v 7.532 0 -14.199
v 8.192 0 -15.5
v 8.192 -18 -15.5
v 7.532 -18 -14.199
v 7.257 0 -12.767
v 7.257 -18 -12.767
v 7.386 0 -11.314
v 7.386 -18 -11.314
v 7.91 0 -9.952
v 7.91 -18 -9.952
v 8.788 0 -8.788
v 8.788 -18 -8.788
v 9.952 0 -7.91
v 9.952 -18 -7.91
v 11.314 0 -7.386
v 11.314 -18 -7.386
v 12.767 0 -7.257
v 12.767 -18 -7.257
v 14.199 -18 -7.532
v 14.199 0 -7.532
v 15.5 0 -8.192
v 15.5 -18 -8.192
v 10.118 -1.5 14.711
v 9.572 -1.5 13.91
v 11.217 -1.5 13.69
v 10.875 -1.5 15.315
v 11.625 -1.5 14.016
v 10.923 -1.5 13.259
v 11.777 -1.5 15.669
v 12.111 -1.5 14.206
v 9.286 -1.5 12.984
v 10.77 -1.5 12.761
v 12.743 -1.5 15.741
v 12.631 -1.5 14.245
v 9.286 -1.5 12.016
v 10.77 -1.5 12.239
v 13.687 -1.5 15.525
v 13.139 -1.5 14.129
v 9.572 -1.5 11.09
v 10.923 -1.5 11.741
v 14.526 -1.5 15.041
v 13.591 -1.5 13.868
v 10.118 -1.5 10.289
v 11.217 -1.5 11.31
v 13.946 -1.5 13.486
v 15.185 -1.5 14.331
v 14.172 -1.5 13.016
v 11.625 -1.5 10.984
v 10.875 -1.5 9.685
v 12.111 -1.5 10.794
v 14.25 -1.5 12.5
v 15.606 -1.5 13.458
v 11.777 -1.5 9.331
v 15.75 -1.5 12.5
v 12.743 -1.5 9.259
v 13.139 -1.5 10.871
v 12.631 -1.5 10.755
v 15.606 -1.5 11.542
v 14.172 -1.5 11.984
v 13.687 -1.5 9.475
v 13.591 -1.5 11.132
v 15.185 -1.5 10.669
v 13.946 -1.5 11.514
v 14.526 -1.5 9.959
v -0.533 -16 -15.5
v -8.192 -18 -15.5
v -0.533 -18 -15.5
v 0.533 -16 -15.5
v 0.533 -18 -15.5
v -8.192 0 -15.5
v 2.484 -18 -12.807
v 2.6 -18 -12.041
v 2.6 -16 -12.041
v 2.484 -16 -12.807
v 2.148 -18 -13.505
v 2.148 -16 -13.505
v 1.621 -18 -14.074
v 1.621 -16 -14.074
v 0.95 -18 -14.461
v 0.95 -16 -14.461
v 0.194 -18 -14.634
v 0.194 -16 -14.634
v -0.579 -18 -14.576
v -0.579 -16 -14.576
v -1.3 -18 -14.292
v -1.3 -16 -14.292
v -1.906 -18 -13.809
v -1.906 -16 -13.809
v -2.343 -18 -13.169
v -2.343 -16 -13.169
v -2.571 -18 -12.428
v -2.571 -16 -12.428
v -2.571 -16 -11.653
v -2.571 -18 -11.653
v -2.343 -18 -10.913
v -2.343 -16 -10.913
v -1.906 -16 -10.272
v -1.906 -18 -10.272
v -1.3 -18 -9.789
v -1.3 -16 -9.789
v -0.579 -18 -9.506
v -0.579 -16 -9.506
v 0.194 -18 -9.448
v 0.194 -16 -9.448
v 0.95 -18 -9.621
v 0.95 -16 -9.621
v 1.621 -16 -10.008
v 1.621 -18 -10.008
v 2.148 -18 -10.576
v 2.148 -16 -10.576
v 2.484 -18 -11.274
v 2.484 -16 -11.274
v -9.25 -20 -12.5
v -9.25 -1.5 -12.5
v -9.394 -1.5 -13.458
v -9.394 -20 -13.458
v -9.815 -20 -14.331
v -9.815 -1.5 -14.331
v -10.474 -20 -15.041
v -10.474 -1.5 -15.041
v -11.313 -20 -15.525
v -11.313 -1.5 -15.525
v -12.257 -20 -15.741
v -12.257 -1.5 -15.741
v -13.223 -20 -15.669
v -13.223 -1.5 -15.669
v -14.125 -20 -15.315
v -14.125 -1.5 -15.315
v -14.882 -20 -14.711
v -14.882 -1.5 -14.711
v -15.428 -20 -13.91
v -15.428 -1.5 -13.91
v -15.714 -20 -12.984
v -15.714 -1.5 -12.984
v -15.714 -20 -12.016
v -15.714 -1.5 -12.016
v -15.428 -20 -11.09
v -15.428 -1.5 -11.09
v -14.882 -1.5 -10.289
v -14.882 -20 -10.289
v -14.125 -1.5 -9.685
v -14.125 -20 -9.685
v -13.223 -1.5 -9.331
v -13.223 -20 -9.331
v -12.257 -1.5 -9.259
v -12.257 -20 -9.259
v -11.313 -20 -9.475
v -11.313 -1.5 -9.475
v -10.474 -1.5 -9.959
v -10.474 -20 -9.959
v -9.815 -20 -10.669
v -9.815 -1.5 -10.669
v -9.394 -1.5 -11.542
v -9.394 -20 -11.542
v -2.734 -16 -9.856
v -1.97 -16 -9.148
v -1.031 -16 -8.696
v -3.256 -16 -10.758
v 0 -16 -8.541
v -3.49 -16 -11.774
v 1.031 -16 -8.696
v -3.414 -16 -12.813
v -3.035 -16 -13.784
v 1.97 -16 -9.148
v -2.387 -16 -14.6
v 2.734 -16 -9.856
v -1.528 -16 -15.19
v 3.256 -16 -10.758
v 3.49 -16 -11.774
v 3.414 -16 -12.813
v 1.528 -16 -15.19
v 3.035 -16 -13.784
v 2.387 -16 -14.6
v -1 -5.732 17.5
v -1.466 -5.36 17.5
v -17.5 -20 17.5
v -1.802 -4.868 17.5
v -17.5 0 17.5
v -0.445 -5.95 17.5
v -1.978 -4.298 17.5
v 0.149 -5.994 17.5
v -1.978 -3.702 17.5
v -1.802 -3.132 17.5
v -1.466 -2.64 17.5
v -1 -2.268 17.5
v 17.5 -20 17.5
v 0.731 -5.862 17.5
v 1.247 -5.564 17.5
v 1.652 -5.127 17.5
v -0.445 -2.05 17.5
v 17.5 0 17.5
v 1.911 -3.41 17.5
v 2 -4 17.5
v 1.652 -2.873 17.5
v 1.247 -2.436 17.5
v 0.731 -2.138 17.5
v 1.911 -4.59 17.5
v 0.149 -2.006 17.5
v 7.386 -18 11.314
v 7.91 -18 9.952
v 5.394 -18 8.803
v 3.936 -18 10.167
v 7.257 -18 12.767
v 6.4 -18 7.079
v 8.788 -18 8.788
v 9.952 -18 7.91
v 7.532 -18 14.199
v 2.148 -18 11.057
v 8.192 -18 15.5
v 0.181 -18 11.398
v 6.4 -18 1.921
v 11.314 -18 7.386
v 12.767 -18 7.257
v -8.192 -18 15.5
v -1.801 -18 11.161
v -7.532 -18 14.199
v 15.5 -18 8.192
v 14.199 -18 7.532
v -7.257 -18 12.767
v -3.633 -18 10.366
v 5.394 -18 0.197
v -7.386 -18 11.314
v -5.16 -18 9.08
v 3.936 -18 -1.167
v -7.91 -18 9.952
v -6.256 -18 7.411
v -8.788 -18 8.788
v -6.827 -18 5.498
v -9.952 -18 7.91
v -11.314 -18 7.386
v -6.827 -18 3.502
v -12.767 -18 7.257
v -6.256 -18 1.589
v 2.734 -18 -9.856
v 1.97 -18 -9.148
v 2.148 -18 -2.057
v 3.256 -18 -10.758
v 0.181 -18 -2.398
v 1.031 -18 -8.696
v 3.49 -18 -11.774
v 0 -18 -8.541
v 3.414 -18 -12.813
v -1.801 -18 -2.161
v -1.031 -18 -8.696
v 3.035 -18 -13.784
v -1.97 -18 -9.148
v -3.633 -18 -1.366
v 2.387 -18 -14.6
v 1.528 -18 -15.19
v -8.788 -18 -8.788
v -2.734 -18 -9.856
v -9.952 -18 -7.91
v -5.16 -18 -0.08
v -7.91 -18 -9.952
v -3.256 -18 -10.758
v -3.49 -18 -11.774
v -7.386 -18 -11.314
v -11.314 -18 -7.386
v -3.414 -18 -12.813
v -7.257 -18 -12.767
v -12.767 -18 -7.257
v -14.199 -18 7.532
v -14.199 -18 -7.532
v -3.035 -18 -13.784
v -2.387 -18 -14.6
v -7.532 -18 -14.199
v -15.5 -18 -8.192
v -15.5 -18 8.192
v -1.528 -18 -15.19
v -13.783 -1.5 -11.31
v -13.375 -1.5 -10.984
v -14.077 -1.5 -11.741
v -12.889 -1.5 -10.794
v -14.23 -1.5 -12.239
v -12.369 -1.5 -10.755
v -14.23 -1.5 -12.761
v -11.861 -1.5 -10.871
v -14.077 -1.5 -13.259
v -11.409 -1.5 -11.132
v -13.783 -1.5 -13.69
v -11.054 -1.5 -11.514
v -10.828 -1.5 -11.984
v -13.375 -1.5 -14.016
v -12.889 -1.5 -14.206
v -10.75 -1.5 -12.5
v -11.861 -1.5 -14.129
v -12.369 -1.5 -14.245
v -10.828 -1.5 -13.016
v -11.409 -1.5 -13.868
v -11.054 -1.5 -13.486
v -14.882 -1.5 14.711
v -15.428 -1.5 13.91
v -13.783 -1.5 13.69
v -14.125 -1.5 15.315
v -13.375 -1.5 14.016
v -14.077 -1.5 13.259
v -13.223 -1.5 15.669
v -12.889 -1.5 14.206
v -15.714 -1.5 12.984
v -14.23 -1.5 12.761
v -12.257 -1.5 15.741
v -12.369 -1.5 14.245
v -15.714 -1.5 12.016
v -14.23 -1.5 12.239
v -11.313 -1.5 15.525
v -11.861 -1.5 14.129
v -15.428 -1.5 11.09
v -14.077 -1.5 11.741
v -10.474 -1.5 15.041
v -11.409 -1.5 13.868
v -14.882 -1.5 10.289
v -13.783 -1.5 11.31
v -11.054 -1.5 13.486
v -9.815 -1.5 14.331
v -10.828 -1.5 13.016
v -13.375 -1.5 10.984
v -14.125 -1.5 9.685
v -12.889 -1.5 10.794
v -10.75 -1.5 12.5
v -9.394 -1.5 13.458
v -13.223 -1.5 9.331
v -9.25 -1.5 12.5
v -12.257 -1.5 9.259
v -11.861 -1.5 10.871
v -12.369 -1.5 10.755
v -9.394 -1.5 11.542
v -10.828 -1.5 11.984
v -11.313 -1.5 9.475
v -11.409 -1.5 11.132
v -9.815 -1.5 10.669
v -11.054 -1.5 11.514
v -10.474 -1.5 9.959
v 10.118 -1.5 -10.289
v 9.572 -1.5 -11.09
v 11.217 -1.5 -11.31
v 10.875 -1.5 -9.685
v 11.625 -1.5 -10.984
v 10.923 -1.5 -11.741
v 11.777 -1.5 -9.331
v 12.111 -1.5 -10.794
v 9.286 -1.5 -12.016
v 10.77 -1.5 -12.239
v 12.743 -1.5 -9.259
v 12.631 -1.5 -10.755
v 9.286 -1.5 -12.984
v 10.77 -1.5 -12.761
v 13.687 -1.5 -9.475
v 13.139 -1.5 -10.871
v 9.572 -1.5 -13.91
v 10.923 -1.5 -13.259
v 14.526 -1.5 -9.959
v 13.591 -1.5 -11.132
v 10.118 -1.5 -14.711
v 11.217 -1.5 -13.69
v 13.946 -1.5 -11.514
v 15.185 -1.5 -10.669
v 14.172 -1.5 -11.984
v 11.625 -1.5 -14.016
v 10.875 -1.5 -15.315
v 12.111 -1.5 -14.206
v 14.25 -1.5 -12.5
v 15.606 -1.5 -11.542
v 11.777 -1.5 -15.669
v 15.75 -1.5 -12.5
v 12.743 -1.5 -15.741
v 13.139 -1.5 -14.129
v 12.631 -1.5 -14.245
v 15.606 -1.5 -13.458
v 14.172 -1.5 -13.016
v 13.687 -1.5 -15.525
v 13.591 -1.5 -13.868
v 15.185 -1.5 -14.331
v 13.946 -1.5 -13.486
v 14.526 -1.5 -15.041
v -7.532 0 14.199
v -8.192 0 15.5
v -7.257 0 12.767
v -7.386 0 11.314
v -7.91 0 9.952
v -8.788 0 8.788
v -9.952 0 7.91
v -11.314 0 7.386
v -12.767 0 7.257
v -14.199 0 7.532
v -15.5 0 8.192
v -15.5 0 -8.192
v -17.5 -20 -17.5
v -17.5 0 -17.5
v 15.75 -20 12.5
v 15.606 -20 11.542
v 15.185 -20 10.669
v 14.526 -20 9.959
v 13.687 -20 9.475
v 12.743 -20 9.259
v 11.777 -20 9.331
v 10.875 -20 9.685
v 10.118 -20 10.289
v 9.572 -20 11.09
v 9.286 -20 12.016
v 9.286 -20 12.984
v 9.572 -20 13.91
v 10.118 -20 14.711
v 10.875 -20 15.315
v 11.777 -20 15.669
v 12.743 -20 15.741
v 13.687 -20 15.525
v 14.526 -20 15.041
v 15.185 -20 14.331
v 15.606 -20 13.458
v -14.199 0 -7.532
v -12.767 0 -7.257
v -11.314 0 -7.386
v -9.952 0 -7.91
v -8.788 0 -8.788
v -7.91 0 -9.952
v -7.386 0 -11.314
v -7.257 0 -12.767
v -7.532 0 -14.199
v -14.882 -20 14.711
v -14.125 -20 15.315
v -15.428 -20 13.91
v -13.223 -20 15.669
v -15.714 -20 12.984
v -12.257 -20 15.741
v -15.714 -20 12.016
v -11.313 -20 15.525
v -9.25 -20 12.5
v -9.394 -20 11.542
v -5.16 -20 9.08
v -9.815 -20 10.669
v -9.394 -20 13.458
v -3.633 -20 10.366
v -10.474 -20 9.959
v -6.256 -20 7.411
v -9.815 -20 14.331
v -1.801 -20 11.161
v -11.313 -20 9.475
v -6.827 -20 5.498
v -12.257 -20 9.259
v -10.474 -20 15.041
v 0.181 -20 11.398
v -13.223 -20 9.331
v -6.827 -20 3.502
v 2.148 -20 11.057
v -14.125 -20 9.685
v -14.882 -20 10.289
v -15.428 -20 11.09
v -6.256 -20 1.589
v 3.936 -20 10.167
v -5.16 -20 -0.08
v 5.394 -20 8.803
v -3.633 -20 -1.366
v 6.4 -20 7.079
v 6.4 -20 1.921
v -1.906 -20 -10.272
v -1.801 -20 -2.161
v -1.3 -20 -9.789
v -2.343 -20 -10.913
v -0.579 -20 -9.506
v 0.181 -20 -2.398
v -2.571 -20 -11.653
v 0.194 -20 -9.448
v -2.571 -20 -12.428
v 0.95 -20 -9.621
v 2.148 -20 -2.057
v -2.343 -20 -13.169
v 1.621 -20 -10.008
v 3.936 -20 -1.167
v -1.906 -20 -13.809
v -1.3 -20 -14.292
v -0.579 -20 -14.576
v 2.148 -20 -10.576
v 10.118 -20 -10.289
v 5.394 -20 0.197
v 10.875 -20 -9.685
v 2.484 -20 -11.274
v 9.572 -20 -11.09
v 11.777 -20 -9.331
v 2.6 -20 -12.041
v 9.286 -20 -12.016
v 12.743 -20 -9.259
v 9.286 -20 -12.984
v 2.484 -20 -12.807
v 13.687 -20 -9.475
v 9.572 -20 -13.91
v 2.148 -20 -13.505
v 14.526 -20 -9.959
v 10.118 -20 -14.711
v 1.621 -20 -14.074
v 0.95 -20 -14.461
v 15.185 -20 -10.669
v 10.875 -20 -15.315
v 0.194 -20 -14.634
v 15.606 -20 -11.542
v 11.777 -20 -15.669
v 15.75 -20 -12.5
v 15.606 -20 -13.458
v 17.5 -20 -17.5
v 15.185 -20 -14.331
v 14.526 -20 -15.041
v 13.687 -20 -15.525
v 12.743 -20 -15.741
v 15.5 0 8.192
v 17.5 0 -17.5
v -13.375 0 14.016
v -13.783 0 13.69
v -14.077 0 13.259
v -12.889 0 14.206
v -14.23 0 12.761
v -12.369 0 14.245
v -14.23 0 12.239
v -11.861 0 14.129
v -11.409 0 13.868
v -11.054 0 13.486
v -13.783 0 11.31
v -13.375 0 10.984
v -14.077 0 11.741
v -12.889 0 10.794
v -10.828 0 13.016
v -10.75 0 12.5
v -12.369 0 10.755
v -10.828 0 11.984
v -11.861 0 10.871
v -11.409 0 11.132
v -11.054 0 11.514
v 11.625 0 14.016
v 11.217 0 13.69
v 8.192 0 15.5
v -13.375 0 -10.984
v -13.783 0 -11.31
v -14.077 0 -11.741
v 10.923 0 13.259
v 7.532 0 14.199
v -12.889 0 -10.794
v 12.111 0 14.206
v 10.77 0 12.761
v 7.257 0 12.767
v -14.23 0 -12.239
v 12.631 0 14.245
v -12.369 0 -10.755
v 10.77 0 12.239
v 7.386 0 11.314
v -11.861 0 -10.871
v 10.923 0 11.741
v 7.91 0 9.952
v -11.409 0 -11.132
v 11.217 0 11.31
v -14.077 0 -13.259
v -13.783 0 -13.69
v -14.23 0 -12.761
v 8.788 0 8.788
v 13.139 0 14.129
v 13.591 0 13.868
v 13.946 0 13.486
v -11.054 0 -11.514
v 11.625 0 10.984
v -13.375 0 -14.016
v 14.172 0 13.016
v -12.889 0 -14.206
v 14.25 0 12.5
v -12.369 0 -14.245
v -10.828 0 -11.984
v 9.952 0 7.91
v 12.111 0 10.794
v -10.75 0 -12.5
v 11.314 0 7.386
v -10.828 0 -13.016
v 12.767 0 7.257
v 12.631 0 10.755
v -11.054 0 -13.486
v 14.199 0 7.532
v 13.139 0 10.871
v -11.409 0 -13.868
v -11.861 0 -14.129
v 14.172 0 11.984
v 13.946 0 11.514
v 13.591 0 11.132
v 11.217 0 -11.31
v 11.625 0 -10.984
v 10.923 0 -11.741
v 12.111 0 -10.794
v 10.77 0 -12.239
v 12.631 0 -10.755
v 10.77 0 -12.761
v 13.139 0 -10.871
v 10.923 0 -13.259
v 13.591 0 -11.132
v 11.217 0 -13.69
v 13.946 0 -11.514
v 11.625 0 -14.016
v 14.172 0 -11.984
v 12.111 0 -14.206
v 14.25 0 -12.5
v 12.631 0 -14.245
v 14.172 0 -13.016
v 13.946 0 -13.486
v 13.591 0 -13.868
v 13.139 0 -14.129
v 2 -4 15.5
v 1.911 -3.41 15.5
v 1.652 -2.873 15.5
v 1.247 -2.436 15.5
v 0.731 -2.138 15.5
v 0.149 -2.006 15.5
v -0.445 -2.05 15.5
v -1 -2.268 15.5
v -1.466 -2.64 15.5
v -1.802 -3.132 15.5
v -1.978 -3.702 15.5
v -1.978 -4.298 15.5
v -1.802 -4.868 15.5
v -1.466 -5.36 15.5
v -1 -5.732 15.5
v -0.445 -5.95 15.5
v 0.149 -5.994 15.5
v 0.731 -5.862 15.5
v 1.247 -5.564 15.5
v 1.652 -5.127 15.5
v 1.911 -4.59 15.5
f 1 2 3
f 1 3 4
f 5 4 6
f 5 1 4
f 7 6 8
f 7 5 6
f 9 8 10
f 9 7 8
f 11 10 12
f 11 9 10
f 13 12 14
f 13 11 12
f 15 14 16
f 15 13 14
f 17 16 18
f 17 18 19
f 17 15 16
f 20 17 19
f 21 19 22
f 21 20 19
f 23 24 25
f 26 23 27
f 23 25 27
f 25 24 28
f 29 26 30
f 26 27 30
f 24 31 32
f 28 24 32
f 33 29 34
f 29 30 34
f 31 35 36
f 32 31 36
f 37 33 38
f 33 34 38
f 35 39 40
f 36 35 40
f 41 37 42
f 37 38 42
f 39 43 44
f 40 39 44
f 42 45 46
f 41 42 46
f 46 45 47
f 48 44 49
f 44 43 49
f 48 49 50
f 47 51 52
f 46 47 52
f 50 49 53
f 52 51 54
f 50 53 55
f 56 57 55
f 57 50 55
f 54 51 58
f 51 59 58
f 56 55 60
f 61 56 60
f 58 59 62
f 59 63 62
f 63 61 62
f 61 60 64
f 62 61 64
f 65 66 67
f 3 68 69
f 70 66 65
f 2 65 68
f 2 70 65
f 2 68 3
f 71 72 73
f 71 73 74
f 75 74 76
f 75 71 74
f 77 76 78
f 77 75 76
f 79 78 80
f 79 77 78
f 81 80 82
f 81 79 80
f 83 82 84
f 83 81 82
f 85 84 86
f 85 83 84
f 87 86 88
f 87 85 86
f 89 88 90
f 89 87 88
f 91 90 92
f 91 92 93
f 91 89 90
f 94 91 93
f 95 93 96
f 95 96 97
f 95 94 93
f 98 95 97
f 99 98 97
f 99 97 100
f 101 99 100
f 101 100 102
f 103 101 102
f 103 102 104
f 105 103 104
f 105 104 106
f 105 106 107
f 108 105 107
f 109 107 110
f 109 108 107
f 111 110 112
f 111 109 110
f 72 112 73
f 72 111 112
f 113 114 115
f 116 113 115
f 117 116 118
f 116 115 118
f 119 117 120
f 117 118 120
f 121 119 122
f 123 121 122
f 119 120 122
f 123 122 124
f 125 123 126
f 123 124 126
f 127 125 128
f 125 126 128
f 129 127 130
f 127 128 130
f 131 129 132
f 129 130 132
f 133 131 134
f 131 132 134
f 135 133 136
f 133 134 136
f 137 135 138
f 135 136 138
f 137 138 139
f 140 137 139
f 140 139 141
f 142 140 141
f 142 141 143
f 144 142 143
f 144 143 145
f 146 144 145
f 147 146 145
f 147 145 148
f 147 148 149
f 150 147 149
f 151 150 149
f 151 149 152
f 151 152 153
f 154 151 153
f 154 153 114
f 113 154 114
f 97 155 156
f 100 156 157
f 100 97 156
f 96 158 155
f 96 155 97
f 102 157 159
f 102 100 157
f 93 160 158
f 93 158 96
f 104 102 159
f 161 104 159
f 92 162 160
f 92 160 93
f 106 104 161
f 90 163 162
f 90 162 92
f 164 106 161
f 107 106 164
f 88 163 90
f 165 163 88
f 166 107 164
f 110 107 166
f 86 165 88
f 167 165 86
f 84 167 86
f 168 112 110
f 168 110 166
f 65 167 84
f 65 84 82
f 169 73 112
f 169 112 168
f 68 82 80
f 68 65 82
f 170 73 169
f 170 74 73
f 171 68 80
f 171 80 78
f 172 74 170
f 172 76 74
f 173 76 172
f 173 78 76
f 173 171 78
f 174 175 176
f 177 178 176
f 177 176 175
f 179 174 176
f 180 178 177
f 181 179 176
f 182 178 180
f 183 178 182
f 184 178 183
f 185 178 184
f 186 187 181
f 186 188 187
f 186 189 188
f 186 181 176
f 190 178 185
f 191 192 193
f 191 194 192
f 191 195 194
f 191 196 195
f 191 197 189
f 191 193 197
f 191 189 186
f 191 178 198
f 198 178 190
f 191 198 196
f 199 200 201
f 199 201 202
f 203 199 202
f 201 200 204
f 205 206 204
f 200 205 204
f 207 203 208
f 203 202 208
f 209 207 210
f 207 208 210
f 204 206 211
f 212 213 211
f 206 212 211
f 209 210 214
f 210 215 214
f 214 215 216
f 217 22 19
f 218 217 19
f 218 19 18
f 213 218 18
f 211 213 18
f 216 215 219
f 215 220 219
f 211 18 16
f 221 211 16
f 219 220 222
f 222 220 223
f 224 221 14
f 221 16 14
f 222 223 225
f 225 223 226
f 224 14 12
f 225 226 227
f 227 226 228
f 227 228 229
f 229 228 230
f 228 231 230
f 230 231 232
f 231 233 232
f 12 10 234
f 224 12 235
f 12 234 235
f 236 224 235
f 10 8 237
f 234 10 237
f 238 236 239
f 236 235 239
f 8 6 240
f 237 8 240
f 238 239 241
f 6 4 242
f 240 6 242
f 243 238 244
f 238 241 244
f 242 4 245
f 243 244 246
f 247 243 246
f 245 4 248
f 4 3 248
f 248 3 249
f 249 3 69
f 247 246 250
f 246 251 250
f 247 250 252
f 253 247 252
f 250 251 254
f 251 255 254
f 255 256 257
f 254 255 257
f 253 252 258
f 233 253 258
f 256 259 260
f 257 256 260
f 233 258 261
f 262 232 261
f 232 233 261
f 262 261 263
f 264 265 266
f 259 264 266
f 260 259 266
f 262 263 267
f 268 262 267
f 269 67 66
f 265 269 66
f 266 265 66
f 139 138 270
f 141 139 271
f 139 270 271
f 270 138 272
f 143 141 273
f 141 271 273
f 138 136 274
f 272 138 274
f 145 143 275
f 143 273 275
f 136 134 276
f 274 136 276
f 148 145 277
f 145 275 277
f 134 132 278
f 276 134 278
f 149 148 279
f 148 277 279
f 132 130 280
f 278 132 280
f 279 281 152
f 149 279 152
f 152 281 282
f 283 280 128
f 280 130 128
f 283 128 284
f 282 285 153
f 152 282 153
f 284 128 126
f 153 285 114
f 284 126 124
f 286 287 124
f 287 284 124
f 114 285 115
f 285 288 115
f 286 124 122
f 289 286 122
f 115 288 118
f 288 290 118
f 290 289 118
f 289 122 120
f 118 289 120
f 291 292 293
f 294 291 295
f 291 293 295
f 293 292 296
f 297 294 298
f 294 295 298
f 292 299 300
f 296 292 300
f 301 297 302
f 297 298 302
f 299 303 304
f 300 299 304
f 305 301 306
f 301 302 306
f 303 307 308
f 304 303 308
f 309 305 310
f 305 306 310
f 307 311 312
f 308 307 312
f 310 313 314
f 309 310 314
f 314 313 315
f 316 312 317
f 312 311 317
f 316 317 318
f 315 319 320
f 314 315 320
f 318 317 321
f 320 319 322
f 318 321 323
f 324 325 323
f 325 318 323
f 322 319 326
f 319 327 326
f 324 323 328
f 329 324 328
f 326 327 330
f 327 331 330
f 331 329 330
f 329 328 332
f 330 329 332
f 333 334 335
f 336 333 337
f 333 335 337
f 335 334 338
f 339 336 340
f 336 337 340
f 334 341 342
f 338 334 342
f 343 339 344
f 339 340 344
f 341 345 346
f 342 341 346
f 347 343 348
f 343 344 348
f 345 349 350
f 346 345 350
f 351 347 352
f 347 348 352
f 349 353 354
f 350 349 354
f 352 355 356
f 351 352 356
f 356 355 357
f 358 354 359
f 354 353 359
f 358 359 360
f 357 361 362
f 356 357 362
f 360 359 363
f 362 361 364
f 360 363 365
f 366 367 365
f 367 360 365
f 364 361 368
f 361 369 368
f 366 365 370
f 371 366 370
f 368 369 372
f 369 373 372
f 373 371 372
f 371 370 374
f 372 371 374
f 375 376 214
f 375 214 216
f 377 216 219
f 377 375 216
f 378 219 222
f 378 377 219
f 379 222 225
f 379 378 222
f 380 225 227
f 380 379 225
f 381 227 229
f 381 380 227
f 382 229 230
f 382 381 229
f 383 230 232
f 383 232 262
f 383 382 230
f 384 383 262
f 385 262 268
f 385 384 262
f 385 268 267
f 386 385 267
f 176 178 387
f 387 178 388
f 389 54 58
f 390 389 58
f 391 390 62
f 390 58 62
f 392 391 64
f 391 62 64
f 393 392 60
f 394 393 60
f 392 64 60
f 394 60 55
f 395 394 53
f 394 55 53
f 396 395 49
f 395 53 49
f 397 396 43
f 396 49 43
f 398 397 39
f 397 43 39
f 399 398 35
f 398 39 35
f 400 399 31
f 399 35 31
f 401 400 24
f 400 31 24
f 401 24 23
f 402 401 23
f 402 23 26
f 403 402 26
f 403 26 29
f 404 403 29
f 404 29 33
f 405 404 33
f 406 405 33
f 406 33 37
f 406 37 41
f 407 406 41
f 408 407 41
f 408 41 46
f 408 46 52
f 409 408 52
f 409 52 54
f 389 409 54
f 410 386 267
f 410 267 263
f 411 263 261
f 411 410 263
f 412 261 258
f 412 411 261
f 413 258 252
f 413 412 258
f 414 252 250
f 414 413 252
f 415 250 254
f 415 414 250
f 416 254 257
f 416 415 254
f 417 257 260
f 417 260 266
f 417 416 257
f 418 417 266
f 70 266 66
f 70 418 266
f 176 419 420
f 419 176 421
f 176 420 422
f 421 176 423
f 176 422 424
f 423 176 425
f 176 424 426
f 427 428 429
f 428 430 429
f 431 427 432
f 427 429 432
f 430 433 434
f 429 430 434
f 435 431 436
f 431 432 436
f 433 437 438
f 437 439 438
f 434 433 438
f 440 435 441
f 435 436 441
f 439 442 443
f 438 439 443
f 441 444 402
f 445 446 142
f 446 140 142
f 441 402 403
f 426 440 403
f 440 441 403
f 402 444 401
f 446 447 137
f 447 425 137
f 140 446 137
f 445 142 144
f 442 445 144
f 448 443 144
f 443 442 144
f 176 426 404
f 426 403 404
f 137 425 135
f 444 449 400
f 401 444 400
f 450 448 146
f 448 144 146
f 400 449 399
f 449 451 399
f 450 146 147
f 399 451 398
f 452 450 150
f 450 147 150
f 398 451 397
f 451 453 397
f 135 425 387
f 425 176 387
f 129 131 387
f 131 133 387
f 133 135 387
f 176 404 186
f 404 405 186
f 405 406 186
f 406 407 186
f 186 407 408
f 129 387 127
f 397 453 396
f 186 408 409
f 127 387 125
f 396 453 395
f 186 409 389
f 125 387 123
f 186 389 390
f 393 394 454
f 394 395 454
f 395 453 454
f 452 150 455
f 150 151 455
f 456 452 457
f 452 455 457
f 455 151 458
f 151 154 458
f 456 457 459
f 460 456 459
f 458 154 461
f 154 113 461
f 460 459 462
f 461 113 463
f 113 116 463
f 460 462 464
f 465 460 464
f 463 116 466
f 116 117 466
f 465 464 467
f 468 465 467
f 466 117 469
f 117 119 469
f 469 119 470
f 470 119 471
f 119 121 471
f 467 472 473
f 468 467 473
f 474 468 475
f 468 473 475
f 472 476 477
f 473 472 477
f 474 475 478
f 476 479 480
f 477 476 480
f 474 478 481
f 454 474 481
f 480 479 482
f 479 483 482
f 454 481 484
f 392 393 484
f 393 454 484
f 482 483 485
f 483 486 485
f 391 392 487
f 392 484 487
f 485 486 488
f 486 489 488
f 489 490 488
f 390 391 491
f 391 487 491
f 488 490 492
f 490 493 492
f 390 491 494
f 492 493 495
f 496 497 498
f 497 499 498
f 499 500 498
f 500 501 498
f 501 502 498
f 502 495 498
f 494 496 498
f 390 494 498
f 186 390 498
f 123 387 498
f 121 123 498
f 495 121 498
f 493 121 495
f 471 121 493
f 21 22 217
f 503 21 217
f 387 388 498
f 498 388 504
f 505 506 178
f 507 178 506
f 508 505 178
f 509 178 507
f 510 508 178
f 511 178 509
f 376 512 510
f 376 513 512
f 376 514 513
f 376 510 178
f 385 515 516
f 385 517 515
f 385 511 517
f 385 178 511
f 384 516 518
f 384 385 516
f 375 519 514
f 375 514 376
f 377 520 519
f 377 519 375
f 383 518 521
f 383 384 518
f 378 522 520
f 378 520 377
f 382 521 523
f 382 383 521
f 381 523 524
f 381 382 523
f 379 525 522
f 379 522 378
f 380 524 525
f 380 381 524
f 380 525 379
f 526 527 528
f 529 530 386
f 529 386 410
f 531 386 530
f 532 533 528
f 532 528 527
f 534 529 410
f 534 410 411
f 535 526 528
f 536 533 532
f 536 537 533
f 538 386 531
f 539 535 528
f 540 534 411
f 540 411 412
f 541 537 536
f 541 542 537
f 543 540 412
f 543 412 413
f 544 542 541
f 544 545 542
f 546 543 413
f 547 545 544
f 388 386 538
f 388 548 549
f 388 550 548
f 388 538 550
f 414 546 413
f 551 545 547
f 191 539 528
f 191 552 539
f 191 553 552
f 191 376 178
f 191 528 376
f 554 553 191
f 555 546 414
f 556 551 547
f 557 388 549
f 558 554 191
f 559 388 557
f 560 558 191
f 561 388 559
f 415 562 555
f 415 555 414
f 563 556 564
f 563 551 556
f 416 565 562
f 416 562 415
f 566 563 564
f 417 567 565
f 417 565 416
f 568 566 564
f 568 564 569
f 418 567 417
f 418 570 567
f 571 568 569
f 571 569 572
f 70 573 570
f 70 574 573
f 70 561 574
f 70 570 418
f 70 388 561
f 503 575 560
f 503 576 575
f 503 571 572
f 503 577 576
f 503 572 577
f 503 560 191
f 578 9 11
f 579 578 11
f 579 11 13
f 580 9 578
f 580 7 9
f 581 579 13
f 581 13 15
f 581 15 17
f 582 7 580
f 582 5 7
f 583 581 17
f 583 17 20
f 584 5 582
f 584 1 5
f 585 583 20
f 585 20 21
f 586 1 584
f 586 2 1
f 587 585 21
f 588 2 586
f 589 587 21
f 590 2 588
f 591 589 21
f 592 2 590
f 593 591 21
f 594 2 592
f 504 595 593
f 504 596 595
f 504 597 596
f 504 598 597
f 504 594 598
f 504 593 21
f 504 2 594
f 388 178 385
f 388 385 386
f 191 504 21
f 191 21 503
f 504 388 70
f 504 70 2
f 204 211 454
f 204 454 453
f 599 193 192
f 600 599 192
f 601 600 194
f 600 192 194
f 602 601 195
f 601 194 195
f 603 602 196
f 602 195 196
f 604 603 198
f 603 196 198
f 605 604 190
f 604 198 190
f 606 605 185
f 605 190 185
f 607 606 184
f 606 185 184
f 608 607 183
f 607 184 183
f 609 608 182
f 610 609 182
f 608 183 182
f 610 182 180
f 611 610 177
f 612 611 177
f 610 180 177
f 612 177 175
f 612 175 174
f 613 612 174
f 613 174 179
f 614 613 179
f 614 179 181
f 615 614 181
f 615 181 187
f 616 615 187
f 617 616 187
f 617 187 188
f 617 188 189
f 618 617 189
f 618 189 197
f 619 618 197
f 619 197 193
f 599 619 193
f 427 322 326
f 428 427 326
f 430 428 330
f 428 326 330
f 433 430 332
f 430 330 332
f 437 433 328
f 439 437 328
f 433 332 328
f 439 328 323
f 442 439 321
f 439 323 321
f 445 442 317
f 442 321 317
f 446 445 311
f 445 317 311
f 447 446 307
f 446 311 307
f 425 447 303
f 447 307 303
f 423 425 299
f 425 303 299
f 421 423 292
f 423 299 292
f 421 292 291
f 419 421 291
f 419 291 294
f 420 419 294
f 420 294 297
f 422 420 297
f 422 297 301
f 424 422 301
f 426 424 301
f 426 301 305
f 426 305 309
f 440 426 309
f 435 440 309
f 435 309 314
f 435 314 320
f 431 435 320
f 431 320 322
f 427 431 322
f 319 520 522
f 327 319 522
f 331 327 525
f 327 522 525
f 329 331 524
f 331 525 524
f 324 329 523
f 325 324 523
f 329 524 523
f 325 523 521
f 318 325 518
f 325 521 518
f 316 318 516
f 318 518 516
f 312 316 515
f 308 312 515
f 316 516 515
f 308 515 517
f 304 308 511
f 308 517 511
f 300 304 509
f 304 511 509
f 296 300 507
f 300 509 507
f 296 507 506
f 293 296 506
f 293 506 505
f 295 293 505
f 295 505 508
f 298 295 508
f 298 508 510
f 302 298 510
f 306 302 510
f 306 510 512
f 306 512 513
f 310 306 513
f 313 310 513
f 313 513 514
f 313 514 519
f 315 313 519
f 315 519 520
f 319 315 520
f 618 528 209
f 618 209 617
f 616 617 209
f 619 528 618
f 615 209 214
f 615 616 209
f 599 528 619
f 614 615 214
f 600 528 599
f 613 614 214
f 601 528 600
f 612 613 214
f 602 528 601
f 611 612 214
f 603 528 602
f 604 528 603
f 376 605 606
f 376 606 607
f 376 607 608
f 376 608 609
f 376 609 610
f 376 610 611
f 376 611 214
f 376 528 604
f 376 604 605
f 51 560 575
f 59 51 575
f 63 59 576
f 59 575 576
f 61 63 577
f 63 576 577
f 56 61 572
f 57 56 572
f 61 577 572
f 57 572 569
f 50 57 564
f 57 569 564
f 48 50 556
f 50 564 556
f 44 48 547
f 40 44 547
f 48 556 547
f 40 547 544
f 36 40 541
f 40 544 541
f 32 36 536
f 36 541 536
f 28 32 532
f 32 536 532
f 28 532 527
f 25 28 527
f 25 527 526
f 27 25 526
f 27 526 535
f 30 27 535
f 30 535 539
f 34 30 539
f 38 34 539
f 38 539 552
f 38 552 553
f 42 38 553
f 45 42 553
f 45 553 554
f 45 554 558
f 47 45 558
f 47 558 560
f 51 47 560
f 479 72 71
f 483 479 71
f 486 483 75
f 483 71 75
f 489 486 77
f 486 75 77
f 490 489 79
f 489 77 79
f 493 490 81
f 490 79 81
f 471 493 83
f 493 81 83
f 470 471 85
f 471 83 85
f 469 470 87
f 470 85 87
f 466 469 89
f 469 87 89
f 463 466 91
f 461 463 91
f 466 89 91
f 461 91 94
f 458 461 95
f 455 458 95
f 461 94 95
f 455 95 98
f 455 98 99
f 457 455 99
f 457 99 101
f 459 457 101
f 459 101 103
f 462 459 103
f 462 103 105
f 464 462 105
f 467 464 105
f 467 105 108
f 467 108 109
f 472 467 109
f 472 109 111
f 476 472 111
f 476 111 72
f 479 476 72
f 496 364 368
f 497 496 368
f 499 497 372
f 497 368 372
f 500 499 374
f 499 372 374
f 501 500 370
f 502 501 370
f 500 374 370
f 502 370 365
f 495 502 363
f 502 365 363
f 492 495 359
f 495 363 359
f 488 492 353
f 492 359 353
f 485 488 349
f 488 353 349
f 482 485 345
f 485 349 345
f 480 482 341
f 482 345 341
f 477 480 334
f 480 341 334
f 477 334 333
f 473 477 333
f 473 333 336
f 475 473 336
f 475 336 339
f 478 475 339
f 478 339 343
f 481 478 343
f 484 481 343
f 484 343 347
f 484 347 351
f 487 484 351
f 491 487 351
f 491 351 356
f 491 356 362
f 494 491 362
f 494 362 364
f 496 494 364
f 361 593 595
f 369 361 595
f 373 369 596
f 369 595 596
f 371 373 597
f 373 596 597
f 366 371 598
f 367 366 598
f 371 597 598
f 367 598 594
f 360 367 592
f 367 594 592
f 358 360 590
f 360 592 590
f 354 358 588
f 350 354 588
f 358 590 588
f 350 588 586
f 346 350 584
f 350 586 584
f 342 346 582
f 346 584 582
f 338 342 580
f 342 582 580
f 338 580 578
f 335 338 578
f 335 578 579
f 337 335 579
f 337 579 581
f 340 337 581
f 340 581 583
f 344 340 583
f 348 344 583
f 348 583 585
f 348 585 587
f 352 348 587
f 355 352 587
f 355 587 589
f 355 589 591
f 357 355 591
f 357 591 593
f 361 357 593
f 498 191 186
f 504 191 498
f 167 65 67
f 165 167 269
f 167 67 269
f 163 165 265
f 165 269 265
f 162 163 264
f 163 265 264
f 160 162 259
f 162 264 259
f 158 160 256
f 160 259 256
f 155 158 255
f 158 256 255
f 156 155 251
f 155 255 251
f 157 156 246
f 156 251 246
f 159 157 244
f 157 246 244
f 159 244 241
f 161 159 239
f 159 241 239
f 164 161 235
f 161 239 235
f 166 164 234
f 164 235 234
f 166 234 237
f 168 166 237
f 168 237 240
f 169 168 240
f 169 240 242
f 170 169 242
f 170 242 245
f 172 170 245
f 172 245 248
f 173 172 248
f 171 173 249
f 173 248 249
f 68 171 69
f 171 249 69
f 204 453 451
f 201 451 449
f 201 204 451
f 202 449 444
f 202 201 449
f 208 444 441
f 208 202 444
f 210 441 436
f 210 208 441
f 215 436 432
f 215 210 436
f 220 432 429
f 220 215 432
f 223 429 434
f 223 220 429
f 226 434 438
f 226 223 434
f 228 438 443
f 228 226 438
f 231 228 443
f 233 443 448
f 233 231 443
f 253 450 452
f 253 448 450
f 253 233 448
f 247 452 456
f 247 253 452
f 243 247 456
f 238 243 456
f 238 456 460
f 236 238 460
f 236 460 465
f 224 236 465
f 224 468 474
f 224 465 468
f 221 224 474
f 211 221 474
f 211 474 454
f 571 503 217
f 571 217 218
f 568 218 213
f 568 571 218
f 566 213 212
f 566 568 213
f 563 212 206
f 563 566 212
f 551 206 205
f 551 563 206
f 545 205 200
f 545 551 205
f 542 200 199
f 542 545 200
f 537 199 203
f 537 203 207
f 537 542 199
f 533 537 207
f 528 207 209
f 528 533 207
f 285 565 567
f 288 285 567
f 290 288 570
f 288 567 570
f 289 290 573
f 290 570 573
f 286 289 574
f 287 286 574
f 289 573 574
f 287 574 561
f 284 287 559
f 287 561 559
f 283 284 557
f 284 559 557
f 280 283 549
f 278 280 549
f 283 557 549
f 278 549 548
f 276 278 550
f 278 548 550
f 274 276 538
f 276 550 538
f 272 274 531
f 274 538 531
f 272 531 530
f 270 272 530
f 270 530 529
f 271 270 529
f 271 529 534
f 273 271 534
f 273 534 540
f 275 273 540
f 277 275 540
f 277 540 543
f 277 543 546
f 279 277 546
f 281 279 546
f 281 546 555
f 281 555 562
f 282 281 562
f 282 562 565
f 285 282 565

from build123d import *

# Parameters (mm, degrees)
SKETCH2_W           = 35
SKETCH2_H           = 35
BOSS_EXTRUDE1_DEPTH = 20
CUT_EXTRUDE1_START  = -1.5
SKETCH4_R           = 3.25
CUT_EXTRUDE1_DEPTH  = 19.5
CAVITY_DEPTH        = 18
SKETCH10_R          = 3.5
SKETCH10_R_2        = 2.6
BOSS_EXTRUDE4_DEPTH = 2
SKETCH8_R           = 1.75
M3_HOLES_DEPTH      = 21
SKETCH9_R           = 2.6
HOLESS_DEPTH        = 3
CUT_EXTRUDE8_REACH  = 37
SKETCH12_R          = 2


with BuildPart() as part:
    # Sketch2 → Boss-Extrude1 (new body)
    with BuildSketch(Plane(origin=(0, 0, 0), x_dir=(1, 0, 0), z_dir=(0, 1, 0))):
        Rectangle(SKETCH2_W, SKETCH2_H)
    extrude(amount=-BOSS_EXTRUDE1_DEPTH)

    # Sketch4 → Cut-Extrude1 (cut, through all)
    with BuildSketch(Plane(origin=(0, 0, 0), x_dir=(1, 0, 0), z_dir=(0, 1, 0)).offset(CUT_EXTRUDE1_START)):
        with Locations((-12.5, 12.5)):
            Circle(SKETCH4_R)
        with Locations((12.5, 12.5)):
            Circle(SKETCH4_R)
        with Locations((-12.5, -12.5)):
            Circle(SKETCH4_R)
        with Locations((12.5, -12.5)):
            Circle(SKETCH4_R)
    extrude(amount=-CUT_EXTRUDE1_DEPTH, mode=Mode.SUBTRACT)

    # Sketch5 → cavity (cut)
    with BuildSketch(Plane(origin=(0, 0, 0), x_dir=(1, 0, 0), z_dir=(0, 1, 0))):
        with BuildLine():
            Line((-8.191578015, 15.5), (0, 15.5))
            Line((0, 15.5), (8.191578015, 15.5))
            ThreePointArc((8.191578015, 15.5), (8.787689399, 8.787689399), (15.5, 8.191578015))
            Line((15.5, 8.191578015), (15.5, 0))
            Line((15.5, 0), (15.5, -8.191578015))
            ThreePointArc((15.5, -8.191578015), (8.787689399, -8.787689399), (8.191578015, -15.5))
            Line((8.191578015, -15.5), (0, -15.5))
            Line((0, -15.5), (-8.191578015, -15.5))
            ThreePointArc((-8.191578015, -15.5), (-8.787689399, -8.787689399), (-15.5, -8.191578015))
            Line((-15.5, -8.191578015), (-15.5, 0))
            Line((-15.5, 0), (-15.5, 8.191578015))
            ThreePointArc((-15.5, 8.191578015), (-8.787689399, 8.787689399), (-8.191578015, 15.5))
        make_face()
    extrude(amount=-CAVITY_DEPTH, mode=Mode.SUBTRACT)

    # Sketch10 → Boss-Extrude4 (add)
    with BuildSketch(Plane(origin=(0, -18, 0), x_dir=(1, 0, 0), z_dir=(0, 1, 0))):
        with Locations((0, 12.040793939)):
            Circle(SKETCH10_R)
        with Locations((0, 12.040793939)):
            Circle(SKETCH10_R_2, mode=Mode.SUBTRACT)
    extrude(amount=BOSS_EXTRUDE4_DEPTH)

    # Sketch8 (on Top Plane) → M3 holes (cut, through all)
    with BuildSketch(Plane(origin=(0, 0, 0), x_dir=(1, 0, 0), z_dir=(0, 1, 0))):
        with Locations((-12.5, 12.5)):
            Circle(SKETCH8_R)
        with Locations((12.5, 12.5)):
            Circle(SKETCH8_R)
        with Locations((12.5, -12.5)):
            Circle(SKETCH8_R)
        with Locations((-12.5, -12.5)):
            Circle(SKETCH8_R)
    extrude(amount=-M3_HOLES_DEPTH, mode=Mode.SUBTRACT)

    # Sketch9 → holess (cut, through all)
    with BuildSketch(Plane(origin=(0, -18, 0), x_dir=(1, 0, 0), z_dir=(0, 1, 0))):
        with Locations((0, 12.040793939)):
            Circle(SKETCH9_R)
        with BuildLine():
            Line((6.4, -1.921240608), (6.4, -7.078759392))
            ThreePointArc((6.4, -7.078759392), (-6.9, -4.5), (6.4, -1.921240608))
        make_face()
    extrude(amount=-HOLESS_DEPTH, mode=Mode.SUBTRACT)

    # Sketch12 → Cut-Extrude8 (cut, up to next)
    with BuildSketch(Plane.XY.offset(17.5), mode=Mode.PRIVATE) as cut_extrude8_sk1:
        with Locations((0, -4)):
            Circle(SKETCH12_R)
    cut_extrude8_tool1 = extrude(cut_extrude8_sk1.sketch, amount=-CUT_EXTRUDE8_REACH, mode=Mode.PRIVATE) & part.part
    add(cut_extrude8_tool1.solids().sort_by_distance((0, -4, 17.5))[0], mode=Mode.SUBTRACT)


solid = part.part
